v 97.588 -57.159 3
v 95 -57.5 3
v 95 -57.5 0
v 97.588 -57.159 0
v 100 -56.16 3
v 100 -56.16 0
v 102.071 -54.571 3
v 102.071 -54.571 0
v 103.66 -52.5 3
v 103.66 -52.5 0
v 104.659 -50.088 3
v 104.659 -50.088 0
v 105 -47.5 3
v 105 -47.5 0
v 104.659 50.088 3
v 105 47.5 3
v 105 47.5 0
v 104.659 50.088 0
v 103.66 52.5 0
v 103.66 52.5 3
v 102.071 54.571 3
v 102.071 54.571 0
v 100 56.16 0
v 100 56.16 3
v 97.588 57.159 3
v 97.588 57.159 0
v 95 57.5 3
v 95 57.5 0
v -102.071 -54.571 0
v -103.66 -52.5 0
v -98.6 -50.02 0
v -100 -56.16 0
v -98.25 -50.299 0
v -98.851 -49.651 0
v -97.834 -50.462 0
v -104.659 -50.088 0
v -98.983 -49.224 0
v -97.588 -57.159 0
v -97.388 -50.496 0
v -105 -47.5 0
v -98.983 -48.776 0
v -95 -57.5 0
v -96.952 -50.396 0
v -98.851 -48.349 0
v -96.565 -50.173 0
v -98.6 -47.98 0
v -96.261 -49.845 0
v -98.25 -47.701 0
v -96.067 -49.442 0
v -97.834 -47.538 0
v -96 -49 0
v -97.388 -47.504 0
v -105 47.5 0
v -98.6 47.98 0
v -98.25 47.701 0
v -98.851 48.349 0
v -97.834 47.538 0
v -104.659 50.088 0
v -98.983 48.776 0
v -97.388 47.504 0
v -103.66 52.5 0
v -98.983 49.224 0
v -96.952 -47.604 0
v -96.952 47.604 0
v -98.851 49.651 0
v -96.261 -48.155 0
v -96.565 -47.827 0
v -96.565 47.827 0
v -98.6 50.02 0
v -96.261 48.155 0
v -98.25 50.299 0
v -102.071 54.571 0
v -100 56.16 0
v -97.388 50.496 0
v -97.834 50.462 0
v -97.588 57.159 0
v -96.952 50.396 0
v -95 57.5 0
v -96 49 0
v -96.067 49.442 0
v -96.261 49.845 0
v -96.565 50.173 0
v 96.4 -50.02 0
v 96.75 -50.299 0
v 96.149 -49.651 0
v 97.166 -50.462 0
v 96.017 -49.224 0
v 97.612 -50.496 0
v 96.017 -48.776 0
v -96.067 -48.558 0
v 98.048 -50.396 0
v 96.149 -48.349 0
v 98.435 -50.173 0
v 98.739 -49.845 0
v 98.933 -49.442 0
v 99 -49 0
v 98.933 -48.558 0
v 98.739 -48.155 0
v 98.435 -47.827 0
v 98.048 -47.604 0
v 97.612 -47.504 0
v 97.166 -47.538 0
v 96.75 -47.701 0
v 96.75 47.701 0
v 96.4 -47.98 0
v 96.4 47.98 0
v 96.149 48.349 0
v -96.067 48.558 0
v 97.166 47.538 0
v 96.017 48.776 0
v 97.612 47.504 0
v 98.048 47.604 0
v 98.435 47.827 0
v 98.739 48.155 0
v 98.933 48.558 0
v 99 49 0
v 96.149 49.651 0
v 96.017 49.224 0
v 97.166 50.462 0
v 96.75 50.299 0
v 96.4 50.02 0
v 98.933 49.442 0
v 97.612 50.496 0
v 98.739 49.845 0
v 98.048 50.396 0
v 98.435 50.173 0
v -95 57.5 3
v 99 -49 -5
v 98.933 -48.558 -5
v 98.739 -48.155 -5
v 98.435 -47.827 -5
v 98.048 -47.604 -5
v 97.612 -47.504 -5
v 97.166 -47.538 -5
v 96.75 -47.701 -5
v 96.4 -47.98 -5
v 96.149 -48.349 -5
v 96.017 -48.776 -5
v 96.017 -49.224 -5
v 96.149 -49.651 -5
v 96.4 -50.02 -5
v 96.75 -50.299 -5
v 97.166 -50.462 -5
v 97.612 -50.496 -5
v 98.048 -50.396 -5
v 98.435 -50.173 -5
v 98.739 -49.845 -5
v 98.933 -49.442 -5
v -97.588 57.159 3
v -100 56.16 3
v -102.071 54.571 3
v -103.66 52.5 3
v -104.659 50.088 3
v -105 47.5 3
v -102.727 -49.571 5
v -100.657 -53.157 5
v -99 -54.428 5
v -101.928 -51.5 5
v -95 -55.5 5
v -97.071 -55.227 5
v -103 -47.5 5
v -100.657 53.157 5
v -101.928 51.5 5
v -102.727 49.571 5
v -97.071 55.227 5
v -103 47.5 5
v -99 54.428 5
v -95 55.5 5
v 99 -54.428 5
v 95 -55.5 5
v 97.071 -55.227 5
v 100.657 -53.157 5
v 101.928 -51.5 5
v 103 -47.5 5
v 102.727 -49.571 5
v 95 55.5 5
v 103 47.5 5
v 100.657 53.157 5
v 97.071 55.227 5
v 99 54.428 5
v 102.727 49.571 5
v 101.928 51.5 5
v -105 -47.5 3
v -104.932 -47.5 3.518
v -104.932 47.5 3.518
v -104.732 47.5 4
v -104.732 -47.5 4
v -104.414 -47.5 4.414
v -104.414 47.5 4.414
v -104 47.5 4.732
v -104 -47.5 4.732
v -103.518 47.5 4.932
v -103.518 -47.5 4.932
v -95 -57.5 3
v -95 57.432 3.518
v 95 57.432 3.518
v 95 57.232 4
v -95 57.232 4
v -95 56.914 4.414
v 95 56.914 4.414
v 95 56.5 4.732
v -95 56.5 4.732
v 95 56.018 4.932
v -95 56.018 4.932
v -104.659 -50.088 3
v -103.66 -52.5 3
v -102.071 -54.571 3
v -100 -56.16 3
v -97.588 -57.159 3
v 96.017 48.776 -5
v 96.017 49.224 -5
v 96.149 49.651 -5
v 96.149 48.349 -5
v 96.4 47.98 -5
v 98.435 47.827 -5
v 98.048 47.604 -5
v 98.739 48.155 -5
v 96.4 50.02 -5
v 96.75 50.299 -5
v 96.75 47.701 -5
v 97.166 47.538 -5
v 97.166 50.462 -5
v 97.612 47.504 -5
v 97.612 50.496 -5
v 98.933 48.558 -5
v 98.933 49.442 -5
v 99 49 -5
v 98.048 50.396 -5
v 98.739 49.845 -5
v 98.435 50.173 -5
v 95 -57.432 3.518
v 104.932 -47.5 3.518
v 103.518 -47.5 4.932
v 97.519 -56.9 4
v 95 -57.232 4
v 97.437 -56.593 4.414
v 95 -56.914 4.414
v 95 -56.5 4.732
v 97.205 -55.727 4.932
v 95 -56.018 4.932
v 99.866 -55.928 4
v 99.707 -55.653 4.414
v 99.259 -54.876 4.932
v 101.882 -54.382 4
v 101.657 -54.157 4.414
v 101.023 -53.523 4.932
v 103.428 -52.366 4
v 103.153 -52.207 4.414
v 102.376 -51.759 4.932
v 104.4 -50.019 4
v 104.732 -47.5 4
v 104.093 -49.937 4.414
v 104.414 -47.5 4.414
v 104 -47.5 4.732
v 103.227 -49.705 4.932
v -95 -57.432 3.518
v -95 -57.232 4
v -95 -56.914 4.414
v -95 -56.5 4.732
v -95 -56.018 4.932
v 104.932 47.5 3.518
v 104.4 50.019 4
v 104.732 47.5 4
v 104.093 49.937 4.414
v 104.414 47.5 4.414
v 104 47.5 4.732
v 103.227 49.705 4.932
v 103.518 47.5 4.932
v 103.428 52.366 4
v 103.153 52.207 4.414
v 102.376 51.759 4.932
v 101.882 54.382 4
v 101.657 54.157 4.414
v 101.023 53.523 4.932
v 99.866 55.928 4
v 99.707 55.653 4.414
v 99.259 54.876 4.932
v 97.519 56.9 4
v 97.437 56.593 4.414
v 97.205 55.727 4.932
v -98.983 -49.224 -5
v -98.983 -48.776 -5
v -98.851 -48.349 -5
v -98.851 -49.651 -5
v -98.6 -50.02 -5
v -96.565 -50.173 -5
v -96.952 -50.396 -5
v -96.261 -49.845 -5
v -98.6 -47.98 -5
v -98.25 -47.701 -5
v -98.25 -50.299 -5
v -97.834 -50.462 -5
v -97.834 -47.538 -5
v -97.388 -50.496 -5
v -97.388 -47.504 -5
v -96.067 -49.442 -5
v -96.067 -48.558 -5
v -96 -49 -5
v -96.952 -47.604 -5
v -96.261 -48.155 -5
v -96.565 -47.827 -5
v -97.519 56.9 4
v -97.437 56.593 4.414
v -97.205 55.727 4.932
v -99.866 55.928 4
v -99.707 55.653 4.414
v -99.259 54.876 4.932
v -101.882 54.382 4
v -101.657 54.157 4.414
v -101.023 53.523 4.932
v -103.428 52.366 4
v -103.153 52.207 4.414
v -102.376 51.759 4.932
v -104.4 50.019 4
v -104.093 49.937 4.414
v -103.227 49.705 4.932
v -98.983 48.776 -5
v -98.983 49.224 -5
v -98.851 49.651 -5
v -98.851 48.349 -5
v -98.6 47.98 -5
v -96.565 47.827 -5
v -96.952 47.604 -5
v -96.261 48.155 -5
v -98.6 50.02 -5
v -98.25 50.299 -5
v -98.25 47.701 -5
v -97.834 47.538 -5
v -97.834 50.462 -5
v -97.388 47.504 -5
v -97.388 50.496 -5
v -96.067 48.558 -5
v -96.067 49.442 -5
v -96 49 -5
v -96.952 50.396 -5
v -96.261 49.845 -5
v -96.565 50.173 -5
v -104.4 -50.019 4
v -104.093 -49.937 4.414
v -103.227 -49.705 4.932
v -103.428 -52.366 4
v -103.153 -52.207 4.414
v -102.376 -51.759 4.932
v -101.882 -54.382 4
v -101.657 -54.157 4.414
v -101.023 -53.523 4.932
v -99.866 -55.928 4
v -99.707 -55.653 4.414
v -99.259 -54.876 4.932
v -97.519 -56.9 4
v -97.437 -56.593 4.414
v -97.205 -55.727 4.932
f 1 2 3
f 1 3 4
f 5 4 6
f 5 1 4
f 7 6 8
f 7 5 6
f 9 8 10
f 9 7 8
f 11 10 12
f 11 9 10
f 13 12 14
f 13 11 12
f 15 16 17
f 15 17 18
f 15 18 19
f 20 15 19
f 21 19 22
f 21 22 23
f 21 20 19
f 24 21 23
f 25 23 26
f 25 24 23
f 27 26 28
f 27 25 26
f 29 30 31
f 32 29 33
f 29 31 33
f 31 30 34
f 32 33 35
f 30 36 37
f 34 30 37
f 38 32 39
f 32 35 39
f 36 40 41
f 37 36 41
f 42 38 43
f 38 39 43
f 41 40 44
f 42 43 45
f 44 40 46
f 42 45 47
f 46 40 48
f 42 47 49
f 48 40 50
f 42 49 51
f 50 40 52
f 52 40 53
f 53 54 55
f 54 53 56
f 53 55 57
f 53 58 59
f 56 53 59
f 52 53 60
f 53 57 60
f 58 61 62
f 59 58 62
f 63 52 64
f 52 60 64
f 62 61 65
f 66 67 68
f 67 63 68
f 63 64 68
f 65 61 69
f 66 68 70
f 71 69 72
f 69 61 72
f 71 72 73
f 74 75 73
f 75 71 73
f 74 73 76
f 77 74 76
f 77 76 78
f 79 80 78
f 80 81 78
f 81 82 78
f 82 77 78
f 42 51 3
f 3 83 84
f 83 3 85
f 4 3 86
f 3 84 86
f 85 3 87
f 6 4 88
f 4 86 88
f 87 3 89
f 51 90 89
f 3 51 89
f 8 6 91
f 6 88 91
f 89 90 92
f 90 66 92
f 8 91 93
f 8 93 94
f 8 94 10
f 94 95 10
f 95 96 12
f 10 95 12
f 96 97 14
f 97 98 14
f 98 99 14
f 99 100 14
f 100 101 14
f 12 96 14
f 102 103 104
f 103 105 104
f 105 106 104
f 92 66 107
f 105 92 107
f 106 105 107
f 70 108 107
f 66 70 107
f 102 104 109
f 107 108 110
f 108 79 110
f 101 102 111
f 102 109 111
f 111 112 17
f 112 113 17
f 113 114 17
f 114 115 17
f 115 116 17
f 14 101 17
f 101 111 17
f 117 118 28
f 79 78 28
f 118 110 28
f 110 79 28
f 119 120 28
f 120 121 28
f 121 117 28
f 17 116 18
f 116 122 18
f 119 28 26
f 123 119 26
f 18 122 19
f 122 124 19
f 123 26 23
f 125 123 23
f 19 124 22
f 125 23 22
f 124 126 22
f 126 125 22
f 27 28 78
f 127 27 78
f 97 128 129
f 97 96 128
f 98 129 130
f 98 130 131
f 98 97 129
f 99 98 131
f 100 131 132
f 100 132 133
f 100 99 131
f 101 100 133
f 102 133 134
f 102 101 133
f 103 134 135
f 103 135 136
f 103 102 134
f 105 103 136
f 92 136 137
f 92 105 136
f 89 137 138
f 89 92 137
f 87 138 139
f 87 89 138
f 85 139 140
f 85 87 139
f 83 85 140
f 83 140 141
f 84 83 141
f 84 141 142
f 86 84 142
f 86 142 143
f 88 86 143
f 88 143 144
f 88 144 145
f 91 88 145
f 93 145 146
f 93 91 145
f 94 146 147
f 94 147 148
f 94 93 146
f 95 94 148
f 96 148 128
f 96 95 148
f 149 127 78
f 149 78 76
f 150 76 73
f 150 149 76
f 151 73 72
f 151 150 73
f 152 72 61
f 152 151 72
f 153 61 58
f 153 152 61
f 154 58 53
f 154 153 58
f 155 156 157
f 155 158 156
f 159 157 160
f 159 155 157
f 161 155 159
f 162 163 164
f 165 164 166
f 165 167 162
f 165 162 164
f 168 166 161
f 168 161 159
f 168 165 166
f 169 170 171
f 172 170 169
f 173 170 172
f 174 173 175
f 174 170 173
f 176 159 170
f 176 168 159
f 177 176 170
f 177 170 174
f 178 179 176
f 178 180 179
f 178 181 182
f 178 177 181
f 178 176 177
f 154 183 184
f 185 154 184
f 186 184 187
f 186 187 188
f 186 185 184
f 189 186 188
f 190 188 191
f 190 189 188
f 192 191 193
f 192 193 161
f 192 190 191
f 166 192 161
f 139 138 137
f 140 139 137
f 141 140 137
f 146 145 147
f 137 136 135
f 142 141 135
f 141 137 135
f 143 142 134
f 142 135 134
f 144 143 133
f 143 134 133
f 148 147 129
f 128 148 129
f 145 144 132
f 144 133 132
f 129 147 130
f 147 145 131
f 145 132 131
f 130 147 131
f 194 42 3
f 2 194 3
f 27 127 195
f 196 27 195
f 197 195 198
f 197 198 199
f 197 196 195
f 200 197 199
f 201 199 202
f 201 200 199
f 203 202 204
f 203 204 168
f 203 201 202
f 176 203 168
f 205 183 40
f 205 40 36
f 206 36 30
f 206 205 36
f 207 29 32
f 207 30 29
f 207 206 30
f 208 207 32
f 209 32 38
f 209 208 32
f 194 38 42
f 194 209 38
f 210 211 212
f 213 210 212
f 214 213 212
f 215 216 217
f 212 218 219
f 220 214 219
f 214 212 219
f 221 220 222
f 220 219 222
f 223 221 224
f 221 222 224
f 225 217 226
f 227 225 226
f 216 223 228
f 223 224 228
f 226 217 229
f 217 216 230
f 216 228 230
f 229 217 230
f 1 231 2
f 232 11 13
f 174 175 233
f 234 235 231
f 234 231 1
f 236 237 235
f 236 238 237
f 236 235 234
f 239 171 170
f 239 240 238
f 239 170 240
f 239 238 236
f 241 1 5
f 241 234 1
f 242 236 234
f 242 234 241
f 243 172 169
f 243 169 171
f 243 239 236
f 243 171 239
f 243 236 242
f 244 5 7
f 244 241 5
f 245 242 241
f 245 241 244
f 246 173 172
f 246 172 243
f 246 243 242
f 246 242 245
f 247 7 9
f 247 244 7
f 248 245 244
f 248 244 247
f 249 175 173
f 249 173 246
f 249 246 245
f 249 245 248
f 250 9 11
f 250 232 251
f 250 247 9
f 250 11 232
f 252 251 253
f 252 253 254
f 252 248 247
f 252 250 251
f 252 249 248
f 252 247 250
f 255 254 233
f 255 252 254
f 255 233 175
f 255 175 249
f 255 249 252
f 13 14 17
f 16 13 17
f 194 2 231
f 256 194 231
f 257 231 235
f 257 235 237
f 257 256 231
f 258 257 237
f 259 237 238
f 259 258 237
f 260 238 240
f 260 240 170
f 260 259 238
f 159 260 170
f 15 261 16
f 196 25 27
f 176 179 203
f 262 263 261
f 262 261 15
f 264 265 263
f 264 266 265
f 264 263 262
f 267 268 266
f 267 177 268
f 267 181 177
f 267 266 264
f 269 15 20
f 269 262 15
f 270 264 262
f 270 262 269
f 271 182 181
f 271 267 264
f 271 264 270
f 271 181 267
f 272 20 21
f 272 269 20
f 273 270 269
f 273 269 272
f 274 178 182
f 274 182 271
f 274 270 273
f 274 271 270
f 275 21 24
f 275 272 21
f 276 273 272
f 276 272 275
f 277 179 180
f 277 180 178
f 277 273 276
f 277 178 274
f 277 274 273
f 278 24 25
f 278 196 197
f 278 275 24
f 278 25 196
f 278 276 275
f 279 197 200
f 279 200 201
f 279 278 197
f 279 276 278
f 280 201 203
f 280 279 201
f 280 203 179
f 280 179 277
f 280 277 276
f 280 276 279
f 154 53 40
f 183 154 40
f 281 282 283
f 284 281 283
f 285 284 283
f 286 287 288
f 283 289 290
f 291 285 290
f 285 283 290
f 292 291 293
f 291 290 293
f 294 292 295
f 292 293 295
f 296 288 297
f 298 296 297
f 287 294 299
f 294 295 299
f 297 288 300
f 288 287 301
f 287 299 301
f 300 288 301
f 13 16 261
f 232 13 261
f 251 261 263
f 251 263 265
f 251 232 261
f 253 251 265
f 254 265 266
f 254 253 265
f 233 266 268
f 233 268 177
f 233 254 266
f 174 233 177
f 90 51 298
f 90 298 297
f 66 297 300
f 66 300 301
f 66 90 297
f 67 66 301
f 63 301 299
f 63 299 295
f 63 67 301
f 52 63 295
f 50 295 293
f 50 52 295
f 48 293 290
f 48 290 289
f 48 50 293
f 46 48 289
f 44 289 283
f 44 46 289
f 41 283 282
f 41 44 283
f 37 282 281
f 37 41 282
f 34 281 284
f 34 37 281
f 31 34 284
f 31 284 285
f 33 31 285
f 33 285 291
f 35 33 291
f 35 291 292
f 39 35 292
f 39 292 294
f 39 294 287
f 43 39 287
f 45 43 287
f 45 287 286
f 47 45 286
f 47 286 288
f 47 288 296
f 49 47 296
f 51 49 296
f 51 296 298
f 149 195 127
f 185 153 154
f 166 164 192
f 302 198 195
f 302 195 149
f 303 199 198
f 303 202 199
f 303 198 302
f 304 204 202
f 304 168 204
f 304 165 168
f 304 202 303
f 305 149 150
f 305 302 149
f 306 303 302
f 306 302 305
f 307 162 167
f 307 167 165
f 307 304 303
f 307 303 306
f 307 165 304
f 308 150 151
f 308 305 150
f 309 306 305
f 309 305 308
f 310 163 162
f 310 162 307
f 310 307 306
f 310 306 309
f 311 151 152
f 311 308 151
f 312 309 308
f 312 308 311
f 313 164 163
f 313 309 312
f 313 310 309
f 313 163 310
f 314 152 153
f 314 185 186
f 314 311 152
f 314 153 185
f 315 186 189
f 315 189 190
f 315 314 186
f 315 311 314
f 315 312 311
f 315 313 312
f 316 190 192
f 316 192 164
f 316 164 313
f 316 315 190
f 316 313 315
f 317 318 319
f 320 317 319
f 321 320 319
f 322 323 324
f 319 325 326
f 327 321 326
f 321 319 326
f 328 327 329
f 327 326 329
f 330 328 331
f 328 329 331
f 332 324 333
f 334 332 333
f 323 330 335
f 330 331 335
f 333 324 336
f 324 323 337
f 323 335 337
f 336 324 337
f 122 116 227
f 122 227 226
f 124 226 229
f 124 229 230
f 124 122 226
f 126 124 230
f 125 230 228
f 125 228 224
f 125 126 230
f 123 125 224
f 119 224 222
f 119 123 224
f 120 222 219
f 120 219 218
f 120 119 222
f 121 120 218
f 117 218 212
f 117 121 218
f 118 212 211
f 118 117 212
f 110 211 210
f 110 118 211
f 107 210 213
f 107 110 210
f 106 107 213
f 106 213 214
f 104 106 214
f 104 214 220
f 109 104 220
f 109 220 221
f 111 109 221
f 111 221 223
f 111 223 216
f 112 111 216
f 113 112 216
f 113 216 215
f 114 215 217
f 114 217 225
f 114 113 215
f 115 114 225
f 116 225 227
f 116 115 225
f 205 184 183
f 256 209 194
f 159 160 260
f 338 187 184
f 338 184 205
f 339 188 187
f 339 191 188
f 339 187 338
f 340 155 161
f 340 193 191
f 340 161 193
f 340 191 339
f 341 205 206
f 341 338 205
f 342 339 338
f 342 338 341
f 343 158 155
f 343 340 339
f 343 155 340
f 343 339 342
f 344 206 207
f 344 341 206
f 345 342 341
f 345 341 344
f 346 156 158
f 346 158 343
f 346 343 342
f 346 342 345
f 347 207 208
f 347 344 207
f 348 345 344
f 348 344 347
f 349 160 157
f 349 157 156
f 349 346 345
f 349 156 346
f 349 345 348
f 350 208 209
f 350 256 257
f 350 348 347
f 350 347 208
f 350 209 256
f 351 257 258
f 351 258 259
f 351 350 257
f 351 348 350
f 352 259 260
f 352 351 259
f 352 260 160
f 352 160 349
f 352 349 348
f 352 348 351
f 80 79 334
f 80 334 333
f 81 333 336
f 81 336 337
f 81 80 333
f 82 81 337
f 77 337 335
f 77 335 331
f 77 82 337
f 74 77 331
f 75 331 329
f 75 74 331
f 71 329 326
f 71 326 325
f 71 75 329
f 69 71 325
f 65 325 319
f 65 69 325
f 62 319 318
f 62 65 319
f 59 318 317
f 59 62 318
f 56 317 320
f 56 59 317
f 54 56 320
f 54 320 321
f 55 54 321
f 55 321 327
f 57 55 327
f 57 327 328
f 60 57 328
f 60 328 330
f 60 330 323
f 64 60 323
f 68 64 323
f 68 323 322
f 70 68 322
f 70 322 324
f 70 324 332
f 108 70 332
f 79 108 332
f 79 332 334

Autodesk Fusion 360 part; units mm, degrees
sketch "Sketch1" plane through (0, 0, 0) normal (0, 0, 1) x (1, 0, 0)
  line L0 (105, 57.5) -> (-105, 57.5)
  line L1 (-105, 57.5) -> (-105, -57.5)
  line L2 (-105, -57.5) -> (105, -57.5)
  line L3 (105, -57.5) -> (105, 57.5)
  line L4 (105, 57.5) -> (-105, -57.5) construction
  line L5 (-105, 57.5) -> (105, -57.5) construction
  circle A0 centre (97.5, -49) radius 1.5
  line L6 (0, 57.5) -> (0, -57.5) construction
  line L7 (-105, 0) -> (105, 0) construction
  circle A1 centre (97.5, 49) radius 1.5
  circle A2 centre (-97.5, -49) radius 1.5
  circle A3 centre (-97.5, 49) radius 1.5
  dimension "d1" = 210
  dimension "d2" = 115
  dimension "d3" = 3
  dimension "d4" = 97.5
  dimension "d5" = 49
extrude "Extrude1" add sketch "Sketch1" along normal blind 5 contours L0 L1 L2 L3 | A0 | A1 | A2 | A3
extrude "Extrude2" add sketch "Sketch1" against normal blind 5 contours A0 | A1 | A2 | A3
fillet "Fillet1" radius 10 4 edges at (-105, -57.5, 2.5) (-105, 57.5, 2.5) (105, -57.5, 2.5) (105, 57.5, 2.5)
fillet "Fillet2" radius 2 8 edges at (102.0711, -54.5711, 5) (105, 0, 5) (102.0711, 54.5711, 5) (0, 57.5, 5) (-102.0711, 54.5711, 5) (-105, 0, 5) (-102.0711, -54.5711, 5) (0, -57.5, 5)
equation "d4 = ( 195 / 2 ) * 1 mm"
equation "d5 = ( 98 / 2 ) * 1 mm"
